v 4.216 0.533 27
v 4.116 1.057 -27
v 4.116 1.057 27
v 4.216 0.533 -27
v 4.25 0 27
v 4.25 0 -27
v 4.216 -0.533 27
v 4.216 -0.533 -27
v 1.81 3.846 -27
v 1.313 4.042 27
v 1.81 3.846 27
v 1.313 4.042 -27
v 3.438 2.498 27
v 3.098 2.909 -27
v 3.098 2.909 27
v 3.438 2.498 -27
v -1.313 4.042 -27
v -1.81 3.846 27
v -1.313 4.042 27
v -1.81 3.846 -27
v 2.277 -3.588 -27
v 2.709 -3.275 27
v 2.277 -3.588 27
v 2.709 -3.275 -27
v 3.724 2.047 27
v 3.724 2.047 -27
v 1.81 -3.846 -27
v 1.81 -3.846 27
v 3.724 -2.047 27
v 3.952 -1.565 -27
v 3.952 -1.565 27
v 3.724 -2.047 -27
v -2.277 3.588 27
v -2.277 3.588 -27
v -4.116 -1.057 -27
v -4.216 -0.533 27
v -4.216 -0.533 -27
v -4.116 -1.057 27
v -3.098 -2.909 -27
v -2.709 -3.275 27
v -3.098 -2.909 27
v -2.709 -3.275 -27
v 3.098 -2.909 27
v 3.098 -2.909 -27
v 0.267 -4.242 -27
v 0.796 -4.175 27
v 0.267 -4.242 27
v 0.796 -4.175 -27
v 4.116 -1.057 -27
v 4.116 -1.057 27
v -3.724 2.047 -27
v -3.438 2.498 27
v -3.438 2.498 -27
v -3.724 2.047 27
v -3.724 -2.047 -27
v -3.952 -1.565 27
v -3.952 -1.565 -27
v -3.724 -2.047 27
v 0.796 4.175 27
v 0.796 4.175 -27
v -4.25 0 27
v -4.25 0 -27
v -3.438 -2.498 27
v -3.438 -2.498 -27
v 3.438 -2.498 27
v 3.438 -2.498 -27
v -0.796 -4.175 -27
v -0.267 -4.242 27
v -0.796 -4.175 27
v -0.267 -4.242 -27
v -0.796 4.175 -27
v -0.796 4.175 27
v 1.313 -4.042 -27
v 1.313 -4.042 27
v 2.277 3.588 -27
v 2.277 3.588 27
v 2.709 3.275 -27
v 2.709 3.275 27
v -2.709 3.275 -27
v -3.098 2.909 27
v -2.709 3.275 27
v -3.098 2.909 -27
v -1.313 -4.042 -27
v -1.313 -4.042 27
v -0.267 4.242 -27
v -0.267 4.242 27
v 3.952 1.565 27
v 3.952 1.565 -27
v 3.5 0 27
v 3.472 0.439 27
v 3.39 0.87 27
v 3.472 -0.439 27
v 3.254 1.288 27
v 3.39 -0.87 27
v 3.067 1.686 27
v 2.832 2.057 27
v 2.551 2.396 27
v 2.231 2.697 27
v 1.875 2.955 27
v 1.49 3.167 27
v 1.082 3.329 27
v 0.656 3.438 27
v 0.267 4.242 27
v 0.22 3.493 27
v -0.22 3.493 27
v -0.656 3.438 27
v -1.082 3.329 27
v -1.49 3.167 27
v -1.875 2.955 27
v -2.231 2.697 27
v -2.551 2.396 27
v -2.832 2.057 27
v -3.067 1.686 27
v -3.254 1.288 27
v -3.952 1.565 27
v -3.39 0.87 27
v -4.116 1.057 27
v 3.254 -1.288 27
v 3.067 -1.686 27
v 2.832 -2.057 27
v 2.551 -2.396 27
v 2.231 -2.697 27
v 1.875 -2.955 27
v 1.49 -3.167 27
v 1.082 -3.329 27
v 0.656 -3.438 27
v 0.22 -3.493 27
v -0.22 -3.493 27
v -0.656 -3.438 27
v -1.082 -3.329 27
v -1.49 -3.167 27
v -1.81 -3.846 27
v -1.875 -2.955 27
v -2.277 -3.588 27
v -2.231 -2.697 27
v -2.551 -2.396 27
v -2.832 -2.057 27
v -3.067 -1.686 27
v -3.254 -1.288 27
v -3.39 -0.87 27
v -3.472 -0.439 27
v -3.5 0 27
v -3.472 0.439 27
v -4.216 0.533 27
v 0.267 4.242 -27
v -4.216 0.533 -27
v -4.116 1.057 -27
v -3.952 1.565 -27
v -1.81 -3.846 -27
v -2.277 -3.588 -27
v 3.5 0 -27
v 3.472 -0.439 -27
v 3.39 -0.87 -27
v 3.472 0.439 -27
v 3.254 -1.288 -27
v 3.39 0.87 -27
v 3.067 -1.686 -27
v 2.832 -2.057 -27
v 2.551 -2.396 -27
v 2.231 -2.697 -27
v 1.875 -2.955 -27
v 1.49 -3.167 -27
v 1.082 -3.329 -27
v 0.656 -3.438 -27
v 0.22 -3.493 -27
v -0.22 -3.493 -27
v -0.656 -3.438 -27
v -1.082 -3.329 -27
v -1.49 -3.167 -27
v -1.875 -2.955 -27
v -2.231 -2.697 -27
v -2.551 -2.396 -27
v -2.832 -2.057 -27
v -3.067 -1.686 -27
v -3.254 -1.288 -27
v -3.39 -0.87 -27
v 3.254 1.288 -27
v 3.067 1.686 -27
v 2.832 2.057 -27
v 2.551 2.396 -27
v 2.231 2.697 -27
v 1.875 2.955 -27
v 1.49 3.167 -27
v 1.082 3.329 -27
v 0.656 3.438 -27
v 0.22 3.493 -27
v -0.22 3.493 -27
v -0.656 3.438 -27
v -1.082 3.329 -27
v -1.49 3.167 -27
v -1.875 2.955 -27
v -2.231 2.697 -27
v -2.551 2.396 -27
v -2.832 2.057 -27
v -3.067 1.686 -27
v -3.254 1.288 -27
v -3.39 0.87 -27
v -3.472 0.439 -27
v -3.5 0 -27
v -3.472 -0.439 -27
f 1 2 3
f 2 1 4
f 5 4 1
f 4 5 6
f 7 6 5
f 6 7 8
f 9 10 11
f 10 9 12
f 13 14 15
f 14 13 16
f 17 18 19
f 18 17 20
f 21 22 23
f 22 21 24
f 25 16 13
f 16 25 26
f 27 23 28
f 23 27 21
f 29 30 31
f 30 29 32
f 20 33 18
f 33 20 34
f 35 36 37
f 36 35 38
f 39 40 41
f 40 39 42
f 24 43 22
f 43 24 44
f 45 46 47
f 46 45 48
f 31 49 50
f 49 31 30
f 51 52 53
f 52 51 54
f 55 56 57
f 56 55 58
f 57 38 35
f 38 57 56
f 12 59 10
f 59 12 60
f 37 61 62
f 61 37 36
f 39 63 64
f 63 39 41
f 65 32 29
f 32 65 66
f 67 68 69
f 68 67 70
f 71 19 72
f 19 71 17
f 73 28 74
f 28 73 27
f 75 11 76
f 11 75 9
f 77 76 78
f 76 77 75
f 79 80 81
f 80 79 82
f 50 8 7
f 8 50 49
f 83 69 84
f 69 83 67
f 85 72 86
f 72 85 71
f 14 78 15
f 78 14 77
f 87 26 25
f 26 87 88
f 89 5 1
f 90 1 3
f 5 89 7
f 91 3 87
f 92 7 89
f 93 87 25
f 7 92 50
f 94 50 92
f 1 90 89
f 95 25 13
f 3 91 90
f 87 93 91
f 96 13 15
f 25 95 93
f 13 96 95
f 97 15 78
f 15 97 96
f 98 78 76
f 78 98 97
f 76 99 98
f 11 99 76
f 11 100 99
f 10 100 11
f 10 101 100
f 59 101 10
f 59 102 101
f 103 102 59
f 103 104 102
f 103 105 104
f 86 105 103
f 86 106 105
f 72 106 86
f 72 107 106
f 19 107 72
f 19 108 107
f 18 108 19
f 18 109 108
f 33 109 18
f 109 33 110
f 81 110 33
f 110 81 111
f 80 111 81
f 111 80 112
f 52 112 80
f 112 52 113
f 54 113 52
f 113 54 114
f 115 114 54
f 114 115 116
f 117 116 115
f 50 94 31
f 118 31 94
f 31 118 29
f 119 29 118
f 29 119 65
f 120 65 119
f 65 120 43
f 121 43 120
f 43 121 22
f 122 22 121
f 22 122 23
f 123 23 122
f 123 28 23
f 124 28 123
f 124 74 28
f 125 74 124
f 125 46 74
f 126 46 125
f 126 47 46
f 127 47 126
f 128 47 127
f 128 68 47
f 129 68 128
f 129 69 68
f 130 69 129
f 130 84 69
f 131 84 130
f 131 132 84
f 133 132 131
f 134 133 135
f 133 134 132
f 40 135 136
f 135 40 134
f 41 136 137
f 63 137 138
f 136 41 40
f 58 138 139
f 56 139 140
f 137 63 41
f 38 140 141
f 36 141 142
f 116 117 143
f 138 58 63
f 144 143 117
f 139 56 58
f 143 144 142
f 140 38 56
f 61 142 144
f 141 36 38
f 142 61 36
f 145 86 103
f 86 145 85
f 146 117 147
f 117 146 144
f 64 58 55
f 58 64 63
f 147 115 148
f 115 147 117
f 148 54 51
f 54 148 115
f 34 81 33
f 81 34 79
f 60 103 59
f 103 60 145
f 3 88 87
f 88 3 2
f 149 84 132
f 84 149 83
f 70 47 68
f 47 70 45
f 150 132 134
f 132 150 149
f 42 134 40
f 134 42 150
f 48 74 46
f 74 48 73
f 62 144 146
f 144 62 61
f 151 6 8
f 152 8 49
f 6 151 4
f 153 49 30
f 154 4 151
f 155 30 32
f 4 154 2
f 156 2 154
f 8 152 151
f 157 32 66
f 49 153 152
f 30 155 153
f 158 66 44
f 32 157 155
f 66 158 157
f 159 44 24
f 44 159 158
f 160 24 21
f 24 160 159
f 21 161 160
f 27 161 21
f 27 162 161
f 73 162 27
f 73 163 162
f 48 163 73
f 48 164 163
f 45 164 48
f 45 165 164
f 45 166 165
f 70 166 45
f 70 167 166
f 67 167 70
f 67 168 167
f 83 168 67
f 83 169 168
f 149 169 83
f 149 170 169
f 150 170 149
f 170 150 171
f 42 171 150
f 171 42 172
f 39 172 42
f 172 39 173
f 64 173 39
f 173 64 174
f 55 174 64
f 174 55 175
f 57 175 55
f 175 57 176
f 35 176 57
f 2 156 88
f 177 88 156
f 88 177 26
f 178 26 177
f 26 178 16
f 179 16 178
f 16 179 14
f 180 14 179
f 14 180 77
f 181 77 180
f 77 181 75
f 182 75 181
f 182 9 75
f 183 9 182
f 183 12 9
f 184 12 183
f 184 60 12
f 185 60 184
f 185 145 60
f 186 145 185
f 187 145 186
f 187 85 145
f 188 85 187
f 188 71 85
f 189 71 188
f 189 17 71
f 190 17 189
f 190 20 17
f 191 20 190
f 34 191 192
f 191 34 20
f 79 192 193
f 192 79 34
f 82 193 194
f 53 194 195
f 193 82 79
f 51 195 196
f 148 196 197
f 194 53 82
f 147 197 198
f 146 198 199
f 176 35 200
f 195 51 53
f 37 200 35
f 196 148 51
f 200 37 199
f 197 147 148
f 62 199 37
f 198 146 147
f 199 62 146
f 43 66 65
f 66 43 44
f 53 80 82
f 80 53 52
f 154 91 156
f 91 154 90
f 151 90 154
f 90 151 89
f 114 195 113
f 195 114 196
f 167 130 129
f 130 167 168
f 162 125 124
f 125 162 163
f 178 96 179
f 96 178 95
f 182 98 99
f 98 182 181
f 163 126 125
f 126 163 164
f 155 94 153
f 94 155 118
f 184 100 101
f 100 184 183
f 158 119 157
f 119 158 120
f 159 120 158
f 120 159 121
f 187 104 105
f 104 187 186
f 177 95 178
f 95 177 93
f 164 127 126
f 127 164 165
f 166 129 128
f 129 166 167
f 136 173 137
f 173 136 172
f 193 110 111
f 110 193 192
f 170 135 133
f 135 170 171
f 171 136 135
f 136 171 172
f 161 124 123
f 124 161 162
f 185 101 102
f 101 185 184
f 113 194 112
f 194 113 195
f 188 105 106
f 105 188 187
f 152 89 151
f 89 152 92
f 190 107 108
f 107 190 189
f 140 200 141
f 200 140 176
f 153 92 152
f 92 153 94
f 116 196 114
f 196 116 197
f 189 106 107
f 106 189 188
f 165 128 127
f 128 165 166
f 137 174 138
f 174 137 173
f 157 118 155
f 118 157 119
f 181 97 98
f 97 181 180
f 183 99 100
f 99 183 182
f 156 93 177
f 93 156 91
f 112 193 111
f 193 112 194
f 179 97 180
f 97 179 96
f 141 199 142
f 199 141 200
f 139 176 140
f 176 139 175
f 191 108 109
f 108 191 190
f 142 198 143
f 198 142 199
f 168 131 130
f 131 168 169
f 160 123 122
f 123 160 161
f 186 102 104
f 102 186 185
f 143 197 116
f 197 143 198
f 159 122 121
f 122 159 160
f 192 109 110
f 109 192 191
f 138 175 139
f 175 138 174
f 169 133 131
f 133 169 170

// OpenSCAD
$fn = 50;


difference() {
	union() {
		translate(v = [0, 0, -27.0000000000]) {
			cylinder(h = 54, r = 4.2500000000);
		}
	}
	union() {
		translate(v = [0, 0, -100.0000000000]) {
			cylinder(h = 200, r = 3.5000000000);
		}
	}
}
